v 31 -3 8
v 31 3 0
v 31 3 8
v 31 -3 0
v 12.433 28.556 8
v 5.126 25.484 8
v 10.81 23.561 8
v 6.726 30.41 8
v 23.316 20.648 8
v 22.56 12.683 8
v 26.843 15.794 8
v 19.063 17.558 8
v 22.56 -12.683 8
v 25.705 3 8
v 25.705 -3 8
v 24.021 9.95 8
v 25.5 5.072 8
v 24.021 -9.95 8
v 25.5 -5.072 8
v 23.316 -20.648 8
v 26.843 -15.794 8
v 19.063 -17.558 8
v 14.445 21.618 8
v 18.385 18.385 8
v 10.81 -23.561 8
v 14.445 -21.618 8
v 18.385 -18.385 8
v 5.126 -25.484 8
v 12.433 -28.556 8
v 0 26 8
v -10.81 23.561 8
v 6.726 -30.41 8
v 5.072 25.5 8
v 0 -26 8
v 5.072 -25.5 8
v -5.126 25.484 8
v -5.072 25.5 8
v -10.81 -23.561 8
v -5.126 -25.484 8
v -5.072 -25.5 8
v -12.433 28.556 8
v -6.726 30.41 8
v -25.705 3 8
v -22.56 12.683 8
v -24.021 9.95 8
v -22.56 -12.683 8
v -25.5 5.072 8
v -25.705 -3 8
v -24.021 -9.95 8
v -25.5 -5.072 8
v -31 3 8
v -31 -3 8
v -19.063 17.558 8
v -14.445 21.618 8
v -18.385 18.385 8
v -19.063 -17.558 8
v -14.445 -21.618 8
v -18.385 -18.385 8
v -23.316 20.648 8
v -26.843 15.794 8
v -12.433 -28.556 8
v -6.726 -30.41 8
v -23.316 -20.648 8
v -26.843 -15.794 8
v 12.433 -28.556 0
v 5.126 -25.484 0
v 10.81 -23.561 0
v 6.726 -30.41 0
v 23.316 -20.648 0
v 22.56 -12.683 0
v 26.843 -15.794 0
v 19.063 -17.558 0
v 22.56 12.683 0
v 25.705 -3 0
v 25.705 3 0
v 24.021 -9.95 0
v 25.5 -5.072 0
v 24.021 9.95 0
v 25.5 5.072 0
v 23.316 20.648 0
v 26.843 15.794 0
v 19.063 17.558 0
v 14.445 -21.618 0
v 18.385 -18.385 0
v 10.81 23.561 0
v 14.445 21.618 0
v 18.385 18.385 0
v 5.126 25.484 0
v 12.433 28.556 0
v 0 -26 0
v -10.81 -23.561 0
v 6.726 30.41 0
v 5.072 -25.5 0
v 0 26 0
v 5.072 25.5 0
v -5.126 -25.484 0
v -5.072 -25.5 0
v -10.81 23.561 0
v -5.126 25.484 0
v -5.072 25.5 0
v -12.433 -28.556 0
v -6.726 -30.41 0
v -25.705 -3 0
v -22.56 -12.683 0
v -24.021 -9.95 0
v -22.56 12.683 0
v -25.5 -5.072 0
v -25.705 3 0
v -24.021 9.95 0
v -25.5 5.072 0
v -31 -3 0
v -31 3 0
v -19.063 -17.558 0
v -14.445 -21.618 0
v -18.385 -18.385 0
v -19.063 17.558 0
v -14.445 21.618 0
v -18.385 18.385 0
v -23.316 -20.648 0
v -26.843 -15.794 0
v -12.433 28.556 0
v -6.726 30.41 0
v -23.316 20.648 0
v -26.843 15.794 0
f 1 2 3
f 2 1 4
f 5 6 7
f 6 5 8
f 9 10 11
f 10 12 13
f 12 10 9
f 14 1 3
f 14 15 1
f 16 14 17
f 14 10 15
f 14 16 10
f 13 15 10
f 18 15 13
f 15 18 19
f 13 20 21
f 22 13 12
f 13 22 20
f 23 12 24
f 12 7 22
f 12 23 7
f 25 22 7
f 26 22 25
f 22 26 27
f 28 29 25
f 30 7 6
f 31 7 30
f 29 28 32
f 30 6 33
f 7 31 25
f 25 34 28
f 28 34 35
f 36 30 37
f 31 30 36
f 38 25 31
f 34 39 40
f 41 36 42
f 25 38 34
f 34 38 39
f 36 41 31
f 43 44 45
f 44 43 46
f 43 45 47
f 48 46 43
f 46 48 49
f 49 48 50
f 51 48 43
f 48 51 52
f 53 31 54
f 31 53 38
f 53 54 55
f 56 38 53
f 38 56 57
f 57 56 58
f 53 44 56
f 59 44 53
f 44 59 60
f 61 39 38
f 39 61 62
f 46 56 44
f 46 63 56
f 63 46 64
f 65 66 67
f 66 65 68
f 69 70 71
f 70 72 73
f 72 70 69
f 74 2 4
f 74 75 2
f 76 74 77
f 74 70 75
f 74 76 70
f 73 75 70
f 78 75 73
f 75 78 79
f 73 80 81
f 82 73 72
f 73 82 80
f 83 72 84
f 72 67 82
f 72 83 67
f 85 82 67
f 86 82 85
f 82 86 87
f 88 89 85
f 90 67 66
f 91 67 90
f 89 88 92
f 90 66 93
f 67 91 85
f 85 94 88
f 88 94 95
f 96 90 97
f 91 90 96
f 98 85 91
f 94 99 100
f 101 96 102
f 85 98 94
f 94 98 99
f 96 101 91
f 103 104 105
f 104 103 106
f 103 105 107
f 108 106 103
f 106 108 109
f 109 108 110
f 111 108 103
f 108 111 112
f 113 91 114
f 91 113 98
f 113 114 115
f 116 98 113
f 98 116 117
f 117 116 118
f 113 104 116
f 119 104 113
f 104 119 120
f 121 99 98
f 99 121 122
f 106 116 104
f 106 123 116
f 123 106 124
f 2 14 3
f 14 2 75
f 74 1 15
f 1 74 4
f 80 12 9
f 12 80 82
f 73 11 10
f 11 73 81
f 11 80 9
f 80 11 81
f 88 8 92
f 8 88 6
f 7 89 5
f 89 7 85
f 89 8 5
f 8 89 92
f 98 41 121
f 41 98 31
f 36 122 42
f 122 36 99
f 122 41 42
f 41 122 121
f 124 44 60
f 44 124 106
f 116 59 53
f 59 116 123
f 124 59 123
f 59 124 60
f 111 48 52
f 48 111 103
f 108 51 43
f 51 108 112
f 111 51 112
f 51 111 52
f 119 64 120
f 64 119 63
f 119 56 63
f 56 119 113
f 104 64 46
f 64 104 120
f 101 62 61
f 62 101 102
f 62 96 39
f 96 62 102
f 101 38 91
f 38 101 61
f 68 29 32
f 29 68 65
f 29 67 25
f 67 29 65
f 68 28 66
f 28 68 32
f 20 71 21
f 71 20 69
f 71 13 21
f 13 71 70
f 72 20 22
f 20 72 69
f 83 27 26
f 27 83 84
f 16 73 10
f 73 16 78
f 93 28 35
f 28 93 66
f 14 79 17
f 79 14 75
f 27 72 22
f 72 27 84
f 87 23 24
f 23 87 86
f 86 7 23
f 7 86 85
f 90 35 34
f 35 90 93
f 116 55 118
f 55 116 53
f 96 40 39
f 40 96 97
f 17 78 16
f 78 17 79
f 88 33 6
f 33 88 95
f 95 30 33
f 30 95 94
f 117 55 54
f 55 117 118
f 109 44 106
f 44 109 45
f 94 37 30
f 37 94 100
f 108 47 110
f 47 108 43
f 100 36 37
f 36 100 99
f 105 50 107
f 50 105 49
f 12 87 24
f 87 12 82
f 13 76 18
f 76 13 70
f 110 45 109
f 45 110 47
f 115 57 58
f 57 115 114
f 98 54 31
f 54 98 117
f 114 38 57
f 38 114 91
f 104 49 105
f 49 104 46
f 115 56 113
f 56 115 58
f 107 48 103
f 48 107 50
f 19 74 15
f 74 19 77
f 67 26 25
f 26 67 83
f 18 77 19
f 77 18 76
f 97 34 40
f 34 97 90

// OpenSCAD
$fn = 32;

// ----------------------------------------------------------------------
// Spur blank: plain gear blank
// ----------------------------------------------------------------------

// --- parameters (mm) ---
disc_r = 26;              // blank root radius
disc_t = 8;               // blank thickness
n_teeth = 10;             // stub tooth count
tooth_w = 6;              // tooth width at the root
tooth_h = 5;              // tooth height above the root

out_r = disc_r + tooth_h;  // tip radius
bbox_x = 62.0;  // measured width over the teeth
bbox_y = 60.82;  // measured depth over the teeth

union() {
  cylinder(r = disc_r, h = disc_t);
  for (i = [0 : n_teeth - 1])
    rotate([0, 0, i * 360 / n_teeth])
      translate([disc_r - 1, -tooth_w / 2, 0])
        cube([tooth_h + 1, tooth_w, disc_t]);
}
